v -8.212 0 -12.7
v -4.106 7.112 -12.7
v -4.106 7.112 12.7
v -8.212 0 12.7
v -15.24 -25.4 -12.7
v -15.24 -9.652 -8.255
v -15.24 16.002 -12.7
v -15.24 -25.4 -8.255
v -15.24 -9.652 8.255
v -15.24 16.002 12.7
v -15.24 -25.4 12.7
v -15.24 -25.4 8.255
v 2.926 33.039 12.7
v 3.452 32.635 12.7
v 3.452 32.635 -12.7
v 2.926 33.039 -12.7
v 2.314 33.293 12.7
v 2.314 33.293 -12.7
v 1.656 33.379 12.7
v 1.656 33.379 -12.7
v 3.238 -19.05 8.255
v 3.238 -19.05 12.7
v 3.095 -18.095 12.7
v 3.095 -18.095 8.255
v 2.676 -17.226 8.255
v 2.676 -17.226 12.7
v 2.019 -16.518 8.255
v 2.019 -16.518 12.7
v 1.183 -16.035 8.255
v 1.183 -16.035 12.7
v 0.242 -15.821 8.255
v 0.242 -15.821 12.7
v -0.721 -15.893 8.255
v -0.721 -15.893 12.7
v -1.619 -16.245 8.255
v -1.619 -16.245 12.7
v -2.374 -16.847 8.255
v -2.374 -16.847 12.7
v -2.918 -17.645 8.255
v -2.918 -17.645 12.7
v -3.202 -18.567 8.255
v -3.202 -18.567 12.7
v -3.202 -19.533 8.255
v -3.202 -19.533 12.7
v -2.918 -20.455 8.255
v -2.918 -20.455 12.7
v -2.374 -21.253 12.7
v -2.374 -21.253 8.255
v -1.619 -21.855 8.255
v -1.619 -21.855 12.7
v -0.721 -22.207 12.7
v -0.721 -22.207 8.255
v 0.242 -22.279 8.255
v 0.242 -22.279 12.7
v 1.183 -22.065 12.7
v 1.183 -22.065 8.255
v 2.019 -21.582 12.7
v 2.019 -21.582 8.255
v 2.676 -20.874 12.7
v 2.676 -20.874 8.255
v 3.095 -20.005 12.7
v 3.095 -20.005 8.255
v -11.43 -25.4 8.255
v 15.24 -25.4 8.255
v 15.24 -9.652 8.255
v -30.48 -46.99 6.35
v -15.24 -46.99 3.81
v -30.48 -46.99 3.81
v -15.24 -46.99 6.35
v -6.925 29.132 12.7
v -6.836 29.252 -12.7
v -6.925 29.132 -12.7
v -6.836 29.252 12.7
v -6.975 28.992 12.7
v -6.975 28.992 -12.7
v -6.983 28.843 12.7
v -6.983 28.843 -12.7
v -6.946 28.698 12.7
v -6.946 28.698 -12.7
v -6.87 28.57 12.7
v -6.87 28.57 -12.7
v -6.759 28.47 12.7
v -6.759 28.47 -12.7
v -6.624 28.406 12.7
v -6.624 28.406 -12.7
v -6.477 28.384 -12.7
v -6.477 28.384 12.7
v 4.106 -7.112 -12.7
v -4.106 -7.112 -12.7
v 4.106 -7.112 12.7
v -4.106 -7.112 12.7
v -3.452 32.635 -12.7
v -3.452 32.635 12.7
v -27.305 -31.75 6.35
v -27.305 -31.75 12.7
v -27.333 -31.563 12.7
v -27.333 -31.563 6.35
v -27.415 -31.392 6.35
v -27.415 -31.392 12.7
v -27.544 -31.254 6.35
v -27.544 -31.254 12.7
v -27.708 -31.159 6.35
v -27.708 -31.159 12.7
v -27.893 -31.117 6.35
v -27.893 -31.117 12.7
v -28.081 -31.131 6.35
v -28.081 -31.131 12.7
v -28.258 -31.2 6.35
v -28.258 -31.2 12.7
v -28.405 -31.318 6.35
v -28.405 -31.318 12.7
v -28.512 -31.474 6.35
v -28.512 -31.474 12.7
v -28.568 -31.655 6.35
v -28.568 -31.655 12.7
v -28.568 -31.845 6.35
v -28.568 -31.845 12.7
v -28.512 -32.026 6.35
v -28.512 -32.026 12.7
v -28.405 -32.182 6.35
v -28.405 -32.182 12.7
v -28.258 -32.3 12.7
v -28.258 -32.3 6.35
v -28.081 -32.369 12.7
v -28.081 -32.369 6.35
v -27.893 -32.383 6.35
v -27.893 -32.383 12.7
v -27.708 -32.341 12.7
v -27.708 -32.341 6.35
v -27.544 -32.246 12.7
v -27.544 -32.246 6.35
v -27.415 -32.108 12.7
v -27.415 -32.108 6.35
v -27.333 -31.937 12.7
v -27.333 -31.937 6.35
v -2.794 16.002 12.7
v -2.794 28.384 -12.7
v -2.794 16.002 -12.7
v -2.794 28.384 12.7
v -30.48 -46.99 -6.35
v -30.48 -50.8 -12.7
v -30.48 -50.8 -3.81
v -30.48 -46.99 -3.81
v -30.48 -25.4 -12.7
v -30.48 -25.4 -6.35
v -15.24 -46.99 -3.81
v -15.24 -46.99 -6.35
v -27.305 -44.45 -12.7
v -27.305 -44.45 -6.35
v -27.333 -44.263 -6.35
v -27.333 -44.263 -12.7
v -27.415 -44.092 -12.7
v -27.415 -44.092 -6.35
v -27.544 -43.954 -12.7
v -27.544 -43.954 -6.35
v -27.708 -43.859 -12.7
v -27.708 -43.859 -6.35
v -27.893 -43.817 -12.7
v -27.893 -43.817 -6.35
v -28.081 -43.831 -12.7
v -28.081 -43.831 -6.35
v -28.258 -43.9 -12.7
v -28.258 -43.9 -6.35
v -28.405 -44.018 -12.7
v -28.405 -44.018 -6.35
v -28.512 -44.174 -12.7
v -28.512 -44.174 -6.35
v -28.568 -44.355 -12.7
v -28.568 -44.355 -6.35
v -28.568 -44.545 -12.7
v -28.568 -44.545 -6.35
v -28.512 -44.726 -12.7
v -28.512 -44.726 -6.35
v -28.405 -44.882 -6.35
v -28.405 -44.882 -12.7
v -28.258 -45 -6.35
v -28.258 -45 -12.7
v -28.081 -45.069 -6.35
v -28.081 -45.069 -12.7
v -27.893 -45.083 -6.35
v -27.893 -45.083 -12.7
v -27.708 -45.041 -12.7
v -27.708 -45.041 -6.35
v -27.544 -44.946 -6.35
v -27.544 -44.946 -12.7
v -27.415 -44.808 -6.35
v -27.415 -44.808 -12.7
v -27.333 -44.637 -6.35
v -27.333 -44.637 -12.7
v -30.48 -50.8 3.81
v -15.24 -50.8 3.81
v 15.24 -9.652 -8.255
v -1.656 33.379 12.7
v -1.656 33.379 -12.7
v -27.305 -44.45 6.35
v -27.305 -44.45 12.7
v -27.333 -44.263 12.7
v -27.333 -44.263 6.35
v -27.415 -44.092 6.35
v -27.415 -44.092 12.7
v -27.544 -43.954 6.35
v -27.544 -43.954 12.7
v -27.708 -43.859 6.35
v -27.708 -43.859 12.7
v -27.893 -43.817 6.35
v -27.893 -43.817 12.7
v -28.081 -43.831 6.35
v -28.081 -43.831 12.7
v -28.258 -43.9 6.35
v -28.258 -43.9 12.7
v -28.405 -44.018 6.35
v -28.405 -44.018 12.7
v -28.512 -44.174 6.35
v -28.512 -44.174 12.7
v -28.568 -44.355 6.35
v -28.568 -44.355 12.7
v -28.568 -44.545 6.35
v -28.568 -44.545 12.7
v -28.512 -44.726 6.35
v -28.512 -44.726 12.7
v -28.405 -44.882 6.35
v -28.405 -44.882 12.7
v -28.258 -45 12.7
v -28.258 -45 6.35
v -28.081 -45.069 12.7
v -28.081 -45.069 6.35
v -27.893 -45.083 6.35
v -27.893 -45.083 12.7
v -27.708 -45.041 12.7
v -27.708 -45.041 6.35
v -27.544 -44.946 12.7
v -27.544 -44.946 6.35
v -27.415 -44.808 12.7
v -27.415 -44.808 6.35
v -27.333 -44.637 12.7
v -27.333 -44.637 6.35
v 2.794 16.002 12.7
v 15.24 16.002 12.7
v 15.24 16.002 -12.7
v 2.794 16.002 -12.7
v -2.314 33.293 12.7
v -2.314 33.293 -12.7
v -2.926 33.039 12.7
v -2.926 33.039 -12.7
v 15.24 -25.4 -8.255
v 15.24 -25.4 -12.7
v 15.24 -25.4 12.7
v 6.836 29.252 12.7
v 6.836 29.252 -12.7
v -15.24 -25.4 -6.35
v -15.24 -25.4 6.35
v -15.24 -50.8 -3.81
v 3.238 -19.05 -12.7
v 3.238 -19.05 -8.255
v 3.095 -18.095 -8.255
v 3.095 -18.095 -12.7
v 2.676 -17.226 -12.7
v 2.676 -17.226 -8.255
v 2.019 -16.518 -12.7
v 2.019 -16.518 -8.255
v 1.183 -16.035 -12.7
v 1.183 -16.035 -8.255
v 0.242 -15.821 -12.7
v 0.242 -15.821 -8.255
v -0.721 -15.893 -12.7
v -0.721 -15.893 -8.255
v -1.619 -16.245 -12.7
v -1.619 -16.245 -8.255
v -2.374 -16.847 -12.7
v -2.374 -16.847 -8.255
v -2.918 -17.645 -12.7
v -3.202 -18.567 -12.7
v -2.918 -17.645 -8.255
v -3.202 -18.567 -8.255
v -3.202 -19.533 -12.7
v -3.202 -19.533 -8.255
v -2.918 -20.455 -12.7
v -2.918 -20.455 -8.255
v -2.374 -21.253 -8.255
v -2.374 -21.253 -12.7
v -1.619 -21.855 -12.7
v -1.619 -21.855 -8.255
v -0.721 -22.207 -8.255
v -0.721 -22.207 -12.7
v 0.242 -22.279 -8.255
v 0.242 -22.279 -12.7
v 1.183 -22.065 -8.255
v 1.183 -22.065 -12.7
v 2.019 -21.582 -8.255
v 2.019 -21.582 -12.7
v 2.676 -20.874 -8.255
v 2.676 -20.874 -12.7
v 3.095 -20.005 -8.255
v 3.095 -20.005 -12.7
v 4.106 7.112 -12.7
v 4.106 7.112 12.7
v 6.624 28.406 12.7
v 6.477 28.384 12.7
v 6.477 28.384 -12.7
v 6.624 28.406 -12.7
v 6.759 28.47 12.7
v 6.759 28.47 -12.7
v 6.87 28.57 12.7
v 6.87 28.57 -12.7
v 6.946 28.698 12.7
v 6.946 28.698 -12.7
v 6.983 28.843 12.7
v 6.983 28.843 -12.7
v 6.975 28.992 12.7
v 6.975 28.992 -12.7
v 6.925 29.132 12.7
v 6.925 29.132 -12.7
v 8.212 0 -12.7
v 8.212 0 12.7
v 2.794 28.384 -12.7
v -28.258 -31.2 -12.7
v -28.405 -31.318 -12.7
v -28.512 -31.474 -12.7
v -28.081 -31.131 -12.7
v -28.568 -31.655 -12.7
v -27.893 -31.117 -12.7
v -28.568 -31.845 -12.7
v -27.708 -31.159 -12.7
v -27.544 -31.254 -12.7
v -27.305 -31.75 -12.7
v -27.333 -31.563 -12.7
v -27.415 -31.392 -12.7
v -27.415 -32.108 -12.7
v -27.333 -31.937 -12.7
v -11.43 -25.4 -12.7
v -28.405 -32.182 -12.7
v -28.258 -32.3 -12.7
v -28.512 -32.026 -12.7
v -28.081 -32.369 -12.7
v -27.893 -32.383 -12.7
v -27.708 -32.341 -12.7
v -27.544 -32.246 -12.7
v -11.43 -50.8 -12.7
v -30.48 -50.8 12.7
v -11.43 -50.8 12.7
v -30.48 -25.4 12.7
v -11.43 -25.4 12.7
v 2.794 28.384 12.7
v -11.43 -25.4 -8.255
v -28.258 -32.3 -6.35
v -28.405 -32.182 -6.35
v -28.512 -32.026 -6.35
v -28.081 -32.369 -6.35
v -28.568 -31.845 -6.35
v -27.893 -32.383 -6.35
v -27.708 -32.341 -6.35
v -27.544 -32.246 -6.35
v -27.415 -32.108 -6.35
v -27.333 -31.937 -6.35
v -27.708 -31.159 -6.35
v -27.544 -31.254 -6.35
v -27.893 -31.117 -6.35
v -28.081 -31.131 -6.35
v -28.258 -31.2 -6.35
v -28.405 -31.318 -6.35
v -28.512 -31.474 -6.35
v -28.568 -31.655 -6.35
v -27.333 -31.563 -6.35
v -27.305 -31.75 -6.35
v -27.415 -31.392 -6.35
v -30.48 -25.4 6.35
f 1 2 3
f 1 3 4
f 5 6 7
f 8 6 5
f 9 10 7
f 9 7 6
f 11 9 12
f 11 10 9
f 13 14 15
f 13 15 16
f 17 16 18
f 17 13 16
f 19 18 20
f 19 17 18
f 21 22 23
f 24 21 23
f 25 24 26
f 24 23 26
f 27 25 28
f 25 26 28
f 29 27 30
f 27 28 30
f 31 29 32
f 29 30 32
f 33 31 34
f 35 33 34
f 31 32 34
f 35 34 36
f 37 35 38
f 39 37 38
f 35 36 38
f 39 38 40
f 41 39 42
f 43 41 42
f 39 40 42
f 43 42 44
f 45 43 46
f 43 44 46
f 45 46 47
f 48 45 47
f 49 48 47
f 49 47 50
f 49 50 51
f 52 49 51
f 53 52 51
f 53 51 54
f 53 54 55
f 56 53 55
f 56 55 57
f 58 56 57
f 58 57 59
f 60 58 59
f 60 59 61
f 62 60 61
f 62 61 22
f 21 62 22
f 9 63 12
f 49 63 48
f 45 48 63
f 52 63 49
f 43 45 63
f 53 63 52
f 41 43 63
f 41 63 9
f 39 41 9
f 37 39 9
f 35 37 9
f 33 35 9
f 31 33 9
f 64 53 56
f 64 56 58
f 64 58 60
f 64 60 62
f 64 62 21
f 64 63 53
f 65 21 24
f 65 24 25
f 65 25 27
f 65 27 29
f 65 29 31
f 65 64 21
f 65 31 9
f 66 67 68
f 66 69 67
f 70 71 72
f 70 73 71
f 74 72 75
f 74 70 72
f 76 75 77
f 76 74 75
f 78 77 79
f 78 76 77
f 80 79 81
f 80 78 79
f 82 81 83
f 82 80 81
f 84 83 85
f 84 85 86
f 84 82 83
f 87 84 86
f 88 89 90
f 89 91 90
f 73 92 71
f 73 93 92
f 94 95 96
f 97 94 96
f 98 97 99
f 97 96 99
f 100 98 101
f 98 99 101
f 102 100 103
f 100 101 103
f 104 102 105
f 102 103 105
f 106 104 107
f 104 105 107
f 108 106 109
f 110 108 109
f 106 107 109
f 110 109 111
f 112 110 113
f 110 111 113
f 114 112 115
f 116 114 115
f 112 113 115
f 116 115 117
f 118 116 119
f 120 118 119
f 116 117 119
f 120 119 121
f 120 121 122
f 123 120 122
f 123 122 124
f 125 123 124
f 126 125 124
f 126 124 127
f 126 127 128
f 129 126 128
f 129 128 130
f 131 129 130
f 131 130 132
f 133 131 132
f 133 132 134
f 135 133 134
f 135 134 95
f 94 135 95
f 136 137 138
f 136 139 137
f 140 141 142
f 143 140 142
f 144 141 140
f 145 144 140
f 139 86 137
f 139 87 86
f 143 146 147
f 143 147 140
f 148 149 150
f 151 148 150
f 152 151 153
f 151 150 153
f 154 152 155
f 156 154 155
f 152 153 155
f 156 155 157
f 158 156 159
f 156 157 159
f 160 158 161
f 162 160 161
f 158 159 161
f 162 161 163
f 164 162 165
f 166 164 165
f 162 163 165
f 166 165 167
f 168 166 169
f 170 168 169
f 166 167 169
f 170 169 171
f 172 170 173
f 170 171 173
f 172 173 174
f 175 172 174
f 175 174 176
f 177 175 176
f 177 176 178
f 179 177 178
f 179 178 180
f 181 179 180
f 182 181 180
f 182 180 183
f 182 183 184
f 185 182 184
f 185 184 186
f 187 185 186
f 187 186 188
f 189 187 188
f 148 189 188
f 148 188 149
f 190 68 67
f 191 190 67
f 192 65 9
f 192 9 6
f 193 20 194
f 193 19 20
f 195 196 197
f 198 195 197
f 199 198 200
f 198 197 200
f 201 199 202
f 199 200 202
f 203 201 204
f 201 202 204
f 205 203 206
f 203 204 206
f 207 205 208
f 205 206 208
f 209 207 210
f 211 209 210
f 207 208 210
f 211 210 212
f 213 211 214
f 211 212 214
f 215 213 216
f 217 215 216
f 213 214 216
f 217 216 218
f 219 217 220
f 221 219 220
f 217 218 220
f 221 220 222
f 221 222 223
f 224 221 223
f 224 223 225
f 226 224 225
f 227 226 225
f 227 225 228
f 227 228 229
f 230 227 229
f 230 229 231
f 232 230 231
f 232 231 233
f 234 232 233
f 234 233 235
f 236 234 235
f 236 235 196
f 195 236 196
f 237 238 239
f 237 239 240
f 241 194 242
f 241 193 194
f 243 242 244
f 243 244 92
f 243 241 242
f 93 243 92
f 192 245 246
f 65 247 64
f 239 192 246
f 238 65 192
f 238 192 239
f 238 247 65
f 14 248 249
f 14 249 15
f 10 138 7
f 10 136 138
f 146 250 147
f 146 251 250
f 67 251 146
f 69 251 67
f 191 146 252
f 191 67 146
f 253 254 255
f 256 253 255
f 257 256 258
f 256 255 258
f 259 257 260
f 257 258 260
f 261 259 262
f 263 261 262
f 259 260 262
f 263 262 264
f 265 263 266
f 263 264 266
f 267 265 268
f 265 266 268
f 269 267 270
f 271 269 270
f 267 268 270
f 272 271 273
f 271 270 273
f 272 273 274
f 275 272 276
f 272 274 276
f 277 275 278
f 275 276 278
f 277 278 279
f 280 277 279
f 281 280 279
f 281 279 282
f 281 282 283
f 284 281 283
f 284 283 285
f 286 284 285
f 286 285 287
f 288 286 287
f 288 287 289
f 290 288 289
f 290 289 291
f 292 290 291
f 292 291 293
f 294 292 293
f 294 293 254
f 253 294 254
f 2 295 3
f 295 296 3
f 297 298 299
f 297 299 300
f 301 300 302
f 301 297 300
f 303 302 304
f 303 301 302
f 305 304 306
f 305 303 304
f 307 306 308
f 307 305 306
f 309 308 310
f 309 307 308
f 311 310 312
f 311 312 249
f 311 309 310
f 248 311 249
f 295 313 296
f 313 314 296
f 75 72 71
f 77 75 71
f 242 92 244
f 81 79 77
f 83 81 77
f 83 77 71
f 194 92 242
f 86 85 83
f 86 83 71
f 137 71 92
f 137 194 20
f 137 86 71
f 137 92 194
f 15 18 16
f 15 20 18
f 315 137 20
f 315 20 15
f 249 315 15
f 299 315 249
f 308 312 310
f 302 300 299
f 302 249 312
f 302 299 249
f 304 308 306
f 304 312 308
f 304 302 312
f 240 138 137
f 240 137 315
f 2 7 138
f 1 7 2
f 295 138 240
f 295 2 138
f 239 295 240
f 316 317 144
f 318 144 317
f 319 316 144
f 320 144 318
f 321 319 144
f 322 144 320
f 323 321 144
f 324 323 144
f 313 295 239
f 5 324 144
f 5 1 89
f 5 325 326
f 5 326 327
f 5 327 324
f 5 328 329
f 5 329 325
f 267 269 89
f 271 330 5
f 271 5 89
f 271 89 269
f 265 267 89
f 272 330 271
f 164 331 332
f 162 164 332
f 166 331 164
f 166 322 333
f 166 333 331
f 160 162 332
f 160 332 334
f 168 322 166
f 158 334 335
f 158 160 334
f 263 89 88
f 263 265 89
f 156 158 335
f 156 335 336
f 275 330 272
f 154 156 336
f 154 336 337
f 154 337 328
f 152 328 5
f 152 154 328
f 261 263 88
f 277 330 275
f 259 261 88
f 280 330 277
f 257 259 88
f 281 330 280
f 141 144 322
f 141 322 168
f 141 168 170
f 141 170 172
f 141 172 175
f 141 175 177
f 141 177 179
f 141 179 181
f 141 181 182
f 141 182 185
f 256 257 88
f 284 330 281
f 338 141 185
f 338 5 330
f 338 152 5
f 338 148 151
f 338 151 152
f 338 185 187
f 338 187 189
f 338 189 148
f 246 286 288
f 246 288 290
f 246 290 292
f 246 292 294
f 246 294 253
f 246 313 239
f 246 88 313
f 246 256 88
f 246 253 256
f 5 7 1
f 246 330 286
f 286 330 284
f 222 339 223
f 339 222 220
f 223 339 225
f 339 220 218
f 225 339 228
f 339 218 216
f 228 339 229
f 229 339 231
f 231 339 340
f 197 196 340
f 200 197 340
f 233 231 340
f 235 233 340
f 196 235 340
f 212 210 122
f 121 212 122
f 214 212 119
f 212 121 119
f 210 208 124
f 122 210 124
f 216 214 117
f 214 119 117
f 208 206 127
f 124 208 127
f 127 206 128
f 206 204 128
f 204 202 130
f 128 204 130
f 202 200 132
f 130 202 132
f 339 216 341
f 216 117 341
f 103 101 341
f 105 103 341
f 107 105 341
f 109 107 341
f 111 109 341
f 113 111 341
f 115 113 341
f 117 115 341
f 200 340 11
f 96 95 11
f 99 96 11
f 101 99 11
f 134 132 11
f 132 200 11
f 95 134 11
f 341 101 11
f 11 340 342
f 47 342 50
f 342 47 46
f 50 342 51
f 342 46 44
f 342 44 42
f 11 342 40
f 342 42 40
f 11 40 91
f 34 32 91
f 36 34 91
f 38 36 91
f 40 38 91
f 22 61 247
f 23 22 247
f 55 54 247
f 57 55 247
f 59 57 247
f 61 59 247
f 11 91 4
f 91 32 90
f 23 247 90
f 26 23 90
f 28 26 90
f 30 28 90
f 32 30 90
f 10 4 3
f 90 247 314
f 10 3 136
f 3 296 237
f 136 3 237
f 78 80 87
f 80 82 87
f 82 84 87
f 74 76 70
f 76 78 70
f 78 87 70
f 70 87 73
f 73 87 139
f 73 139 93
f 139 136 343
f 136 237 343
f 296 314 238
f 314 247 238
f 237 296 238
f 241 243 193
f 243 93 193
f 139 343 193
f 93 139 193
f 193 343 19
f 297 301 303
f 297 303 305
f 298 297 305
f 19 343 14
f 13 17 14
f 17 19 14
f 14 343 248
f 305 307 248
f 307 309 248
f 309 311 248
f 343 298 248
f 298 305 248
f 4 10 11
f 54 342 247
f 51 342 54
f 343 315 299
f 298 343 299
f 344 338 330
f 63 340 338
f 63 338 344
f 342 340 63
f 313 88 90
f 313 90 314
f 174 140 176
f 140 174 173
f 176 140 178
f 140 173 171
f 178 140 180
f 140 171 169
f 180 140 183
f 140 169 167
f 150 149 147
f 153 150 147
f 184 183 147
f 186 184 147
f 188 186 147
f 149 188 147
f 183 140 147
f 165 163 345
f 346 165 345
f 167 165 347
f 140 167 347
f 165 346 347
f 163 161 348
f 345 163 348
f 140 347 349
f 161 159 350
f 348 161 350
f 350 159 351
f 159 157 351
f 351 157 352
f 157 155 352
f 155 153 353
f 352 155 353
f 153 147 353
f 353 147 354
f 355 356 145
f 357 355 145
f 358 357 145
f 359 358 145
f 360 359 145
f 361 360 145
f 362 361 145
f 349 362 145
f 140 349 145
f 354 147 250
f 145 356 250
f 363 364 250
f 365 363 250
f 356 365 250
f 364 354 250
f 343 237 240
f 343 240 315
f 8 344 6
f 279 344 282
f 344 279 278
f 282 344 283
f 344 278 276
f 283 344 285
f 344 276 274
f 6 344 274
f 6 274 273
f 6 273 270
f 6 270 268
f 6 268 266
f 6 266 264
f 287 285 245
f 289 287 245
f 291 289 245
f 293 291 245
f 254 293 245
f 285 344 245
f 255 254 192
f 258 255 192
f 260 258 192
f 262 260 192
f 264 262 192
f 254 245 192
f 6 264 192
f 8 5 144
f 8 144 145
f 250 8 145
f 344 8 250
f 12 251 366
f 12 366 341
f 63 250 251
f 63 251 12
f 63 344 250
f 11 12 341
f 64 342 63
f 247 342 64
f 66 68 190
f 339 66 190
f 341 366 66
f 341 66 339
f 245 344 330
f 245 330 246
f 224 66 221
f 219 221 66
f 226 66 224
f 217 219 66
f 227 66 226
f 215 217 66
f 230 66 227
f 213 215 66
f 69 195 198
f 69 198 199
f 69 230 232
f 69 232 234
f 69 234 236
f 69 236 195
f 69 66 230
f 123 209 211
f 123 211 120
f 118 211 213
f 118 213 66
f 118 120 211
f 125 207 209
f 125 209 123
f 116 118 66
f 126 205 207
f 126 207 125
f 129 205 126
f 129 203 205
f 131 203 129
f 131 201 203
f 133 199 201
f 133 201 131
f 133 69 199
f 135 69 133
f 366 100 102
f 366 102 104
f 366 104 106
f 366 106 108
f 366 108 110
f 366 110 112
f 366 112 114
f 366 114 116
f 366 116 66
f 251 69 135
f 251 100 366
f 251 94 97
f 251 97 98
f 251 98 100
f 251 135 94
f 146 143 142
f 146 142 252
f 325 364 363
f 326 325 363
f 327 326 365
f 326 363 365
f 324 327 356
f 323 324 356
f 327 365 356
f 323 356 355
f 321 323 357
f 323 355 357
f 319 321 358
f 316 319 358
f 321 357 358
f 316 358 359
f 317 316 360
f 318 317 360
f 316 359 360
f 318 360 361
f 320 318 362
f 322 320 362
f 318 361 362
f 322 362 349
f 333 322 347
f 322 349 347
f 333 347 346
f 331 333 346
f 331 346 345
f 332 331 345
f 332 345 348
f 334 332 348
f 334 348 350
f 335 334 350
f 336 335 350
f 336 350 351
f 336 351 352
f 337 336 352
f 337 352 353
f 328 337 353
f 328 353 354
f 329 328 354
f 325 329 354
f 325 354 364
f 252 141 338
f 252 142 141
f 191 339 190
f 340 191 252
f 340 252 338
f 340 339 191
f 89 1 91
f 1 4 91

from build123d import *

# Parameters (mm, degrees)
BOSS_EXTRUDE1_DEPTH             = 12.7
BOSS_EXTRUDE4_REACH             = 14.7
BOSS_EXTRUDE4_DIRECTION_2_REACH = 14.7
SKETCH6_W                       = 16.51
SKETCH6_H                       = 15.748
CUT_EXTRUDE2_DEPTH              = 46.72
SKETCH11_W                      = 15.24
SKETCH11_H                      = 7.62
CUT_EXTRUDE3_DEPTH              = 3.81
SKETCH15_R                      = 3.2385
CUT_EXTRUDE4_DEPTH              = 25.4
SKETCH16_W                      = 6.35
SKETCH16_H                      = 21.59
BOSS_EXTRUDE5_DEPTH             = 15.24
SKETCH17_R                      = 0.635
CUT_EXTRUDE5_DEPTH              = 26.4


with BuildPart() as part:
    # Sketch1 → Boss-Extrude1 (new body, symmetric)
    with BuildSketch(Plane.XY):
        with BuildLine():
            Line((-15.24, 16.002), (-15.24, -25.4))
            Line((-15.24, -25.4), (15.24, -25.4))
            Line((15.24, -25.4), (15.24, 16.002))
            Line((15.24, 16.002), (2.794, 16.002))
            Line((2.794, 16.002), (2.794, 28.3845))
            Line((2.794, 28.3845), (6.477, 28.3845))
            ThreePointArc((6.477, 28.3845), (6.946330803, 28.698096816), (6.836210245, 29.251710245))
            Line((6.836210245, 29.251710245), (3.452459265, 32.635461224))
            ThreePointArc((3.452459265, 32.635461224), (2.628423959, 33.186064013), (1.656408041, 33.37941))
            Line((1.656408041, 33.37941), (-1.656408041, 33.37941))
            ThreePointArc((-1.656408041, 33.37941), (-2.628423959, 33.186064013), (-3.452459265, 32.635461224))
            Line((-3.452459265, 32.635461224), (-6.836210245, 29.251710245))
            ThreePointArc((-6.836210245, 29.251710245), (-6.946330803, 28.698096816), (-6.477, 28.3845))
            Line((-6.477, 28.3845), (-2.794, 28.3845))
            Line((-2.794, 28.3845), (-2.794, 16.002))
            Line((-2.794, 16.002), (-15.24, 16.002))
        make_face()
        Polygon((-4.106115114, 7.112), (-8.212230229, 0), (-4.106115114, -7.112), (4.106115114, -7.112), (8.212230229, 0), (4.106115114, 7.112), align=None, mode=Mode.SUBTRACT)
    extrude(amount=BOSS_EXTRUDE1_DEPTH, both=True)

    # Boss-Extrude4: up to this face of the body (flat: up to its plane)
    boss_extrude4_end = Plane(part.part.faces().sort_by_distance((-6.334610257, 28.951479763, 12.7))[0])
    # Sketch10 → Boss-Extrude4 (add, up to the picked face)
    with BuildSketch(Plane.XY, mode=Mode.PRIVATE) as boss_extrude4_sk1:
        Polygon((-15.24, -25.4), (-15.24, -46.99), (-30.48, -46.99), (-30.48, -50.8), (-11.43, -50.8), (-11.43, -25.4), align=None)
    boss_extrude4_tool1 = split(extrude(boss_extrude4_sk1.sketch, amount=BOSS_EXTRUDE4_REACH, mode=Mode.PRIVATE), bisect_by=boss_extrude4_end, keep=Keep.BOTH, mode=Mode.PRIVATE)
    add(boss_extrude4_tool1.solids().sort_by_distance((-14.9225, -36.195, 0))[0])

    # Boss-Extrude4 direction 2: up to this face of the body (flat: up to its plane)
    boss_extrude4_direction_2_end = Plane(part.part.faces().sort_by_distance((-6.334610257, 28.951479763, -12.7))[0])
    # Sketch10 → Boss-Extrude4 direction 2 (add, up to the picked face)
    with BuildSketch(Plane.XY, mode=Mode.PRIVATE) as boss_extrude4_direction_2_sk1:
        Polygon((-15.24, -25.4), (-15.24, -46.99), (-30.48, -46.99), (-30.48, -50.8), (-11.43, -50.8), (-11.43, -25.4), align=None)
    boss_extrude4_direction_2_tool1 = split(extrude(boss_extrude4_direction_2_sk1.sketch, amount=-BOSS_EXTRUDE4_DIRECTION_2_REACH, mode=Mode.PRIVATE), bisect_by=boss_extrude4_direction_2_end, keep=Keep.BOTH, mode=Mode.PRIVATE)
    add(boss_extrude4_direction_2_tool1.solids().sort_by_distance((-14.9225, -36.195, 0))[0])

    # Sketch6 → Cut-Extrude2 (cut, through all)
    with BuildSketch(Plane(origin=(15.24, 0, 0), x_dir=(0, 0, -1), z_dir=(1, 0, 0))):
        with Locations((0, -17.526)):
            Rectangle(SKETCH6_W, SKETCH6_H)
    extrude(amount=-CUT_EXTRUDE2_DEPTH, mode=Mode.SUBTRACT)

    # Sketch11 → Cut-Extrude3 (cut)
    with BuildSketch(Plane(origin=(0, -46.99, 0), x_dir=(1, 0, 0), z_dir=(0, 1, 0))):
        with Locations((-22.86, 0)):
            Rectangle(SKETCH11_W, SKETCH11_H)
    extrude(amount=-CUT_EXTRUDE3_DEPTH, mode=Mode.SUBTRACT)

    # Sketch15 → Cut-Extrude4 (cut)
    with BuildSketch(Plane.XY.offset(12.7)):
        with Locations((0, -19.05)):
            Circle(SKETCH15_R)
    extrude(amount=-CUT_EXTRUDE4_DEPTH, mode=Mode.SUBTRACT)

    # Sketch16 → Boss-Extrude5 (add)
    with BuildSketch(Plane.ZY.offset(15.24)):
        with Locations((9.525, -36.195)):
            Rectangle(SKETCH16_W, SKETCH16_H)
        with Locations((-9.525, -36.195)):
            Rectangle(SKETCH16_W, SKETCH16_H)
    extrude(amount=BOSS_EXTRUDE5_DEPTH)

    # Sketch17 → Cut-Extrude5 (cut, through all)
    with BuildSketch(Plane.XY.offset(12.7)):
        with Locations((-27.94, -31.75)):
            Circle(SKETCH17_R)
        with Locations((-27.94, -44.45)):
            Circle(SKETCH17_R)
    extrude(amount=-CUT_EXTRUDE5_DEPTH, mode=Mode.SUBTRACT)


solid = part.part
